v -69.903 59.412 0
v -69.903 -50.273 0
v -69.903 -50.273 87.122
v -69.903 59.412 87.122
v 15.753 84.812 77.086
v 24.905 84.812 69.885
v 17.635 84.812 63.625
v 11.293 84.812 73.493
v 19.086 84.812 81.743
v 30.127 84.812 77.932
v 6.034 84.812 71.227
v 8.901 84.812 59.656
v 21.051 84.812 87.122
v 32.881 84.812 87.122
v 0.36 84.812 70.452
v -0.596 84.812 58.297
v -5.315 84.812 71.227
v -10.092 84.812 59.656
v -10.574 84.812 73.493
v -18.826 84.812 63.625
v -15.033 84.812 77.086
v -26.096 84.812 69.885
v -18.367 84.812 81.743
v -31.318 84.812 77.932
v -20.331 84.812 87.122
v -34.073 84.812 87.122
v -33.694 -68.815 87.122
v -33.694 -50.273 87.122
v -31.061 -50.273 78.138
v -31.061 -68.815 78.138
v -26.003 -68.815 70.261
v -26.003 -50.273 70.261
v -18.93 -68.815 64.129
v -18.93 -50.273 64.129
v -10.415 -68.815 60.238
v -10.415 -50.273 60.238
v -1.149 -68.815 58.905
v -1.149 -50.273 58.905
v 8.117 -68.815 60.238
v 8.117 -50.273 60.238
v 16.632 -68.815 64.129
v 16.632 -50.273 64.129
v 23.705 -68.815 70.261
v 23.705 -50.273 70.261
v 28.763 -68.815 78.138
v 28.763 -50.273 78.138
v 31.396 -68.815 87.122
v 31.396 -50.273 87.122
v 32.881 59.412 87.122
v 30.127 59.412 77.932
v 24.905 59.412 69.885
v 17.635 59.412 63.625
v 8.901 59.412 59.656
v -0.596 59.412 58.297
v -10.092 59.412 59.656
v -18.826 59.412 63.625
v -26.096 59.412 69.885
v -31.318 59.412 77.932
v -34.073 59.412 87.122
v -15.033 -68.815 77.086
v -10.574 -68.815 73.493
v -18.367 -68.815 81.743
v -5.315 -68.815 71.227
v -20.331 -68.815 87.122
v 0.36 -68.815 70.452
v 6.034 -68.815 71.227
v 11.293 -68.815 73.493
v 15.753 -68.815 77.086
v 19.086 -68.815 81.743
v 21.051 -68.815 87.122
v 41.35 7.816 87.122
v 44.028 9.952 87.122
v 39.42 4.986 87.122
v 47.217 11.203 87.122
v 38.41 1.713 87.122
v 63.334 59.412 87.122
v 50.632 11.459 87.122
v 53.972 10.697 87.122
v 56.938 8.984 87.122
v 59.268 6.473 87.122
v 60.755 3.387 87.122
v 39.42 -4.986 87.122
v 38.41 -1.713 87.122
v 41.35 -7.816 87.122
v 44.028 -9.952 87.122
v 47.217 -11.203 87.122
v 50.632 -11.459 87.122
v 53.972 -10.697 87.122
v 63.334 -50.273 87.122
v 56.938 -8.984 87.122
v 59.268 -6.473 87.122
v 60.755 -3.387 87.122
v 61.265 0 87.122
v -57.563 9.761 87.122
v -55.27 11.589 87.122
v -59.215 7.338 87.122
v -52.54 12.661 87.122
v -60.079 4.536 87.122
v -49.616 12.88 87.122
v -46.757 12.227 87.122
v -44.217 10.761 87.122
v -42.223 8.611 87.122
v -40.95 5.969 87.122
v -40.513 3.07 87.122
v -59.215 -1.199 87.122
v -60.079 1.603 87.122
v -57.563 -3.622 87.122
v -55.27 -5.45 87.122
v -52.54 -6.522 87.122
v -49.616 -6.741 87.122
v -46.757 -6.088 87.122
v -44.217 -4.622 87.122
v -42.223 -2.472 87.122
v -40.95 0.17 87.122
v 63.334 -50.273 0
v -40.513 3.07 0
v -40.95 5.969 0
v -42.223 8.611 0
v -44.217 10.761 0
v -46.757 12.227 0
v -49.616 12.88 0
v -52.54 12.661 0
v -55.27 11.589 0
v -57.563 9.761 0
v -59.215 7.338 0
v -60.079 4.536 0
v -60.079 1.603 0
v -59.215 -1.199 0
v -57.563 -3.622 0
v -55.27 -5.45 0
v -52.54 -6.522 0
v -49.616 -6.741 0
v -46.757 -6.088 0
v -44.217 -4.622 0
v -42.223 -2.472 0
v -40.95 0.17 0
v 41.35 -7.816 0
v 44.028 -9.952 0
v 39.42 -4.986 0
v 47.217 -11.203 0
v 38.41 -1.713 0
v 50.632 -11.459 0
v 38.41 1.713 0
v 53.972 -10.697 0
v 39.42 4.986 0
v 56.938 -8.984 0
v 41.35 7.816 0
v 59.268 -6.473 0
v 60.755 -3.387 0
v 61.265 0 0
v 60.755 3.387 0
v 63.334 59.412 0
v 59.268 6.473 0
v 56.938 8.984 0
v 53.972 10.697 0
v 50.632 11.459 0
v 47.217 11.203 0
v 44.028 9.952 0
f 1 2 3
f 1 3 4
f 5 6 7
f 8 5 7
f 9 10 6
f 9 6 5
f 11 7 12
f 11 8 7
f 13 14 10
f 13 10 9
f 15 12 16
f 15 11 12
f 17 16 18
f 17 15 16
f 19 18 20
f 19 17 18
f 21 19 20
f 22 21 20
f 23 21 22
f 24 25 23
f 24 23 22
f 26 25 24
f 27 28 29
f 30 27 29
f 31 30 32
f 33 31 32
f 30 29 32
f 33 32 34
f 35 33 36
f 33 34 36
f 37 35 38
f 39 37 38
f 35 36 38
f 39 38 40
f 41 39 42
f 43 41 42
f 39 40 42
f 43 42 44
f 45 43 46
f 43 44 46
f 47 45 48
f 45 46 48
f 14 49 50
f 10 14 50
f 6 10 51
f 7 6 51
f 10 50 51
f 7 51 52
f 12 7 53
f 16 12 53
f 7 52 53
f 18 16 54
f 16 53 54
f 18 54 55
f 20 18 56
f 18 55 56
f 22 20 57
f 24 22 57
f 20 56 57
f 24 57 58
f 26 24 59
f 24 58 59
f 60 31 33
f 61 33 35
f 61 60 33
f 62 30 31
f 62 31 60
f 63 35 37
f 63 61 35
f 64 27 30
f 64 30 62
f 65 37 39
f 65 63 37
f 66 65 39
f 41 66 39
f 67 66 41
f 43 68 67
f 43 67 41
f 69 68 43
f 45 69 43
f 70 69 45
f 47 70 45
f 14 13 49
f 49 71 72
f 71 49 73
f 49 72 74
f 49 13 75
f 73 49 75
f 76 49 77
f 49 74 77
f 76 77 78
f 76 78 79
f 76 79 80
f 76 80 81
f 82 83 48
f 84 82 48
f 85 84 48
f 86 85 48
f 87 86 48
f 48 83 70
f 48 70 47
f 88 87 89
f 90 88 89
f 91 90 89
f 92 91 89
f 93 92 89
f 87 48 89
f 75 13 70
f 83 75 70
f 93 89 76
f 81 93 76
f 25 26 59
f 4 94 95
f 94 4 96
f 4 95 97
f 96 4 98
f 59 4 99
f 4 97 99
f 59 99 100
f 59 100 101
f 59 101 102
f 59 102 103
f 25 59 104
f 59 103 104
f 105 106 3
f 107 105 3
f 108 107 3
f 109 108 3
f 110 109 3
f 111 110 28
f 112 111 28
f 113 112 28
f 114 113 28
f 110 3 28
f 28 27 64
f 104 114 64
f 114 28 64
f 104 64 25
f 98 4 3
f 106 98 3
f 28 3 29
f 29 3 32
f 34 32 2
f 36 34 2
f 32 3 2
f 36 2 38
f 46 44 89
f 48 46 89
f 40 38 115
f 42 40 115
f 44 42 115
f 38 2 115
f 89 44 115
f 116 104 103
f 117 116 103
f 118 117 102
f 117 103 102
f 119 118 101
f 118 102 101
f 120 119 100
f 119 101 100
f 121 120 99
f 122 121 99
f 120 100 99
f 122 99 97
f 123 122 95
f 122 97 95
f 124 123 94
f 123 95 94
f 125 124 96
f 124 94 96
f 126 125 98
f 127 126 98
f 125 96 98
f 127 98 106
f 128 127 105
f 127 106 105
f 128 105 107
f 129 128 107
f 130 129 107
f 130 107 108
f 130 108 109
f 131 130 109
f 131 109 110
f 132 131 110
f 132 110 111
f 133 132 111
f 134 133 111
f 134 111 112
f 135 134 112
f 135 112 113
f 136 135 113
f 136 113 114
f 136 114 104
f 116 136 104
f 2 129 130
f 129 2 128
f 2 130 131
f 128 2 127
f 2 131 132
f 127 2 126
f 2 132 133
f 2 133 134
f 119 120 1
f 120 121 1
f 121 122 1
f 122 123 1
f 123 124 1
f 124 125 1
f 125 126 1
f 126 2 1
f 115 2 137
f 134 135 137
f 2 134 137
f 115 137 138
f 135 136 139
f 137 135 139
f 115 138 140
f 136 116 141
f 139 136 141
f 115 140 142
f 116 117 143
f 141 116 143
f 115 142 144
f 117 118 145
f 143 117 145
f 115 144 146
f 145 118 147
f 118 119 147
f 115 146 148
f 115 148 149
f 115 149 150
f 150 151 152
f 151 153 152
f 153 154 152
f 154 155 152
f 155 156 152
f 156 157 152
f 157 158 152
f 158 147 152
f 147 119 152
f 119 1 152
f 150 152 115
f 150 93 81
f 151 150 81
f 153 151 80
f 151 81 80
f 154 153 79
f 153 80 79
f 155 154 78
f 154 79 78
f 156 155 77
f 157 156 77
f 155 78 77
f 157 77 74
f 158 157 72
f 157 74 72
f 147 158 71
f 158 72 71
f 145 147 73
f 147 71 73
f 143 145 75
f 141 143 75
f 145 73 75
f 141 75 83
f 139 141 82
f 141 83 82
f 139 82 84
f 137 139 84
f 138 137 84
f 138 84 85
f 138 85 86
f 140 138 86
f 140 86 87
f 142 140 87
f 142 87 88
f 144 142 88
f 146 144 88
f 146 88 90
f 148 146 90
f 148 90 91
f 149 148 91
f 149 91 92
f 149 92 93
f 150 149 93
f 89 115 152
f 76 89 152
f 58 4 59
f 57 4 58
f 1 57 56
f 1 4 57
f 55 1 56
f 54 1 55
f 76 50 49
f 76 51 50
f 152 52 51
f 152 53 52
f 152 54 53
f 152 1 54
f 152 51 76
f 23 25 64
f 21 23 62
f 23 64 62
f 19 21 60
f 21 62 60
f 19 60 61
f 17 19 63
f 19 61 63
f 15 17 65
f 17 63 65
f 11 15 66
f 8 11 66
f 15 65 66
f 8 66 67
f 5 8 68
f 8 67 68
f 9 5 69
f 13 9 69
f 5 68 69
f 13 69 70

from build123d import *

# Parameters (mm, degrees)
F0_W     = 133.2367658615
F0_H     = 109.6848323941
F1_DEPTH = 87.122
F3_DEPTH = 18.542
F4_DEPTH = 140.208
F6_DEPTH = 25.4
F7_R     = 9.8377805887
F8_DEPTH = 150.876
F7_R_2   = 11.4915117279
F9_DEPTH = 154.432


with BuildPart() as f1:
    # F0 (on Top) → F1 (new body)
    with BuildSketch(Plane.XY):
        with Locations((-3.2847598195, 4.5694448054)):
            Rectangle(F0_W, F0_H)
    extrude(amount=F1_DEPTH)

    # F2 (on face) → F3 (join)
    with BuildSketch(Plane.XZ.offset(50.2729713917)):
        with BuildLine():
            Line((-20.3312505037, 87.122), (-33.694114536, 87.122))
            ThreePointArc((-33.694114536, 87.122), (-1.149084419, 58.9054568652), (31.395945698, 87.122))
            Line((31.395945698, 87.122), (21.0505016148, 87.122))
            ThreePointArc((21.0505016148, 87.122), (0.3596255556, 70.4522292625), (-20.3312505037, 87.122))
        make_face()
    extrude(amount=F3_DEPTH)

    # F4 (cut): a face of the model
    f4_faces = [f1.faces().sort_by_distance(p)[0] for p in [
        (0.3596255556, -50.2729713917, 80.1609892237),
    ]]
    extrude(f4_faces, amount=-F4_DEPTH, mode=Mode.SUBTRACT)

    # F5 (on face) → F6 (join)
    with BuildSketch(Plane(origin=(0, 59.4118610024, 0), x_dir=(-1, 0, 0), z_dir=(0, 1, 0))):
        with BuildLine():
            Line((-21.0505016148, 87.122), (-32.8814908862, 87.122))
            ThreePointArc((-32.8814908862, 87.122), (0.5957707763, 58.2968596354), (34.0730324388, 87.122))
            Line((34.0730324388, 87.122), (20.3312505037, 87.122))
            ThreePointArc((20.3312505037, 87.122), (-0.3596255556, 70.4522292625), (-21.0505016148, 87.122))
        make_face()
    extrude(amount=F6_DEPTH)

    # F7 (on face) → F8 (cut)
    with BuildSketch(Plane.XY.offset(87.122)):
        with Locations((-50.3509901464, 3.0695819296)):
            Circle(F7_R)
    extrude(amount=-F8_DEPTH, mode=Mode.SUBTRACT)

    # F7 (on face) → F9 (cut)
    with BuildSketch(Plane.XY.offset(87.122)):
        with Locations((49.7736558318, 0)):
            Circle(F7_R_2)
    extrude(amount=-F9_DEPTH, mode=Mode.SUBTRACT)


solid = f1.part
